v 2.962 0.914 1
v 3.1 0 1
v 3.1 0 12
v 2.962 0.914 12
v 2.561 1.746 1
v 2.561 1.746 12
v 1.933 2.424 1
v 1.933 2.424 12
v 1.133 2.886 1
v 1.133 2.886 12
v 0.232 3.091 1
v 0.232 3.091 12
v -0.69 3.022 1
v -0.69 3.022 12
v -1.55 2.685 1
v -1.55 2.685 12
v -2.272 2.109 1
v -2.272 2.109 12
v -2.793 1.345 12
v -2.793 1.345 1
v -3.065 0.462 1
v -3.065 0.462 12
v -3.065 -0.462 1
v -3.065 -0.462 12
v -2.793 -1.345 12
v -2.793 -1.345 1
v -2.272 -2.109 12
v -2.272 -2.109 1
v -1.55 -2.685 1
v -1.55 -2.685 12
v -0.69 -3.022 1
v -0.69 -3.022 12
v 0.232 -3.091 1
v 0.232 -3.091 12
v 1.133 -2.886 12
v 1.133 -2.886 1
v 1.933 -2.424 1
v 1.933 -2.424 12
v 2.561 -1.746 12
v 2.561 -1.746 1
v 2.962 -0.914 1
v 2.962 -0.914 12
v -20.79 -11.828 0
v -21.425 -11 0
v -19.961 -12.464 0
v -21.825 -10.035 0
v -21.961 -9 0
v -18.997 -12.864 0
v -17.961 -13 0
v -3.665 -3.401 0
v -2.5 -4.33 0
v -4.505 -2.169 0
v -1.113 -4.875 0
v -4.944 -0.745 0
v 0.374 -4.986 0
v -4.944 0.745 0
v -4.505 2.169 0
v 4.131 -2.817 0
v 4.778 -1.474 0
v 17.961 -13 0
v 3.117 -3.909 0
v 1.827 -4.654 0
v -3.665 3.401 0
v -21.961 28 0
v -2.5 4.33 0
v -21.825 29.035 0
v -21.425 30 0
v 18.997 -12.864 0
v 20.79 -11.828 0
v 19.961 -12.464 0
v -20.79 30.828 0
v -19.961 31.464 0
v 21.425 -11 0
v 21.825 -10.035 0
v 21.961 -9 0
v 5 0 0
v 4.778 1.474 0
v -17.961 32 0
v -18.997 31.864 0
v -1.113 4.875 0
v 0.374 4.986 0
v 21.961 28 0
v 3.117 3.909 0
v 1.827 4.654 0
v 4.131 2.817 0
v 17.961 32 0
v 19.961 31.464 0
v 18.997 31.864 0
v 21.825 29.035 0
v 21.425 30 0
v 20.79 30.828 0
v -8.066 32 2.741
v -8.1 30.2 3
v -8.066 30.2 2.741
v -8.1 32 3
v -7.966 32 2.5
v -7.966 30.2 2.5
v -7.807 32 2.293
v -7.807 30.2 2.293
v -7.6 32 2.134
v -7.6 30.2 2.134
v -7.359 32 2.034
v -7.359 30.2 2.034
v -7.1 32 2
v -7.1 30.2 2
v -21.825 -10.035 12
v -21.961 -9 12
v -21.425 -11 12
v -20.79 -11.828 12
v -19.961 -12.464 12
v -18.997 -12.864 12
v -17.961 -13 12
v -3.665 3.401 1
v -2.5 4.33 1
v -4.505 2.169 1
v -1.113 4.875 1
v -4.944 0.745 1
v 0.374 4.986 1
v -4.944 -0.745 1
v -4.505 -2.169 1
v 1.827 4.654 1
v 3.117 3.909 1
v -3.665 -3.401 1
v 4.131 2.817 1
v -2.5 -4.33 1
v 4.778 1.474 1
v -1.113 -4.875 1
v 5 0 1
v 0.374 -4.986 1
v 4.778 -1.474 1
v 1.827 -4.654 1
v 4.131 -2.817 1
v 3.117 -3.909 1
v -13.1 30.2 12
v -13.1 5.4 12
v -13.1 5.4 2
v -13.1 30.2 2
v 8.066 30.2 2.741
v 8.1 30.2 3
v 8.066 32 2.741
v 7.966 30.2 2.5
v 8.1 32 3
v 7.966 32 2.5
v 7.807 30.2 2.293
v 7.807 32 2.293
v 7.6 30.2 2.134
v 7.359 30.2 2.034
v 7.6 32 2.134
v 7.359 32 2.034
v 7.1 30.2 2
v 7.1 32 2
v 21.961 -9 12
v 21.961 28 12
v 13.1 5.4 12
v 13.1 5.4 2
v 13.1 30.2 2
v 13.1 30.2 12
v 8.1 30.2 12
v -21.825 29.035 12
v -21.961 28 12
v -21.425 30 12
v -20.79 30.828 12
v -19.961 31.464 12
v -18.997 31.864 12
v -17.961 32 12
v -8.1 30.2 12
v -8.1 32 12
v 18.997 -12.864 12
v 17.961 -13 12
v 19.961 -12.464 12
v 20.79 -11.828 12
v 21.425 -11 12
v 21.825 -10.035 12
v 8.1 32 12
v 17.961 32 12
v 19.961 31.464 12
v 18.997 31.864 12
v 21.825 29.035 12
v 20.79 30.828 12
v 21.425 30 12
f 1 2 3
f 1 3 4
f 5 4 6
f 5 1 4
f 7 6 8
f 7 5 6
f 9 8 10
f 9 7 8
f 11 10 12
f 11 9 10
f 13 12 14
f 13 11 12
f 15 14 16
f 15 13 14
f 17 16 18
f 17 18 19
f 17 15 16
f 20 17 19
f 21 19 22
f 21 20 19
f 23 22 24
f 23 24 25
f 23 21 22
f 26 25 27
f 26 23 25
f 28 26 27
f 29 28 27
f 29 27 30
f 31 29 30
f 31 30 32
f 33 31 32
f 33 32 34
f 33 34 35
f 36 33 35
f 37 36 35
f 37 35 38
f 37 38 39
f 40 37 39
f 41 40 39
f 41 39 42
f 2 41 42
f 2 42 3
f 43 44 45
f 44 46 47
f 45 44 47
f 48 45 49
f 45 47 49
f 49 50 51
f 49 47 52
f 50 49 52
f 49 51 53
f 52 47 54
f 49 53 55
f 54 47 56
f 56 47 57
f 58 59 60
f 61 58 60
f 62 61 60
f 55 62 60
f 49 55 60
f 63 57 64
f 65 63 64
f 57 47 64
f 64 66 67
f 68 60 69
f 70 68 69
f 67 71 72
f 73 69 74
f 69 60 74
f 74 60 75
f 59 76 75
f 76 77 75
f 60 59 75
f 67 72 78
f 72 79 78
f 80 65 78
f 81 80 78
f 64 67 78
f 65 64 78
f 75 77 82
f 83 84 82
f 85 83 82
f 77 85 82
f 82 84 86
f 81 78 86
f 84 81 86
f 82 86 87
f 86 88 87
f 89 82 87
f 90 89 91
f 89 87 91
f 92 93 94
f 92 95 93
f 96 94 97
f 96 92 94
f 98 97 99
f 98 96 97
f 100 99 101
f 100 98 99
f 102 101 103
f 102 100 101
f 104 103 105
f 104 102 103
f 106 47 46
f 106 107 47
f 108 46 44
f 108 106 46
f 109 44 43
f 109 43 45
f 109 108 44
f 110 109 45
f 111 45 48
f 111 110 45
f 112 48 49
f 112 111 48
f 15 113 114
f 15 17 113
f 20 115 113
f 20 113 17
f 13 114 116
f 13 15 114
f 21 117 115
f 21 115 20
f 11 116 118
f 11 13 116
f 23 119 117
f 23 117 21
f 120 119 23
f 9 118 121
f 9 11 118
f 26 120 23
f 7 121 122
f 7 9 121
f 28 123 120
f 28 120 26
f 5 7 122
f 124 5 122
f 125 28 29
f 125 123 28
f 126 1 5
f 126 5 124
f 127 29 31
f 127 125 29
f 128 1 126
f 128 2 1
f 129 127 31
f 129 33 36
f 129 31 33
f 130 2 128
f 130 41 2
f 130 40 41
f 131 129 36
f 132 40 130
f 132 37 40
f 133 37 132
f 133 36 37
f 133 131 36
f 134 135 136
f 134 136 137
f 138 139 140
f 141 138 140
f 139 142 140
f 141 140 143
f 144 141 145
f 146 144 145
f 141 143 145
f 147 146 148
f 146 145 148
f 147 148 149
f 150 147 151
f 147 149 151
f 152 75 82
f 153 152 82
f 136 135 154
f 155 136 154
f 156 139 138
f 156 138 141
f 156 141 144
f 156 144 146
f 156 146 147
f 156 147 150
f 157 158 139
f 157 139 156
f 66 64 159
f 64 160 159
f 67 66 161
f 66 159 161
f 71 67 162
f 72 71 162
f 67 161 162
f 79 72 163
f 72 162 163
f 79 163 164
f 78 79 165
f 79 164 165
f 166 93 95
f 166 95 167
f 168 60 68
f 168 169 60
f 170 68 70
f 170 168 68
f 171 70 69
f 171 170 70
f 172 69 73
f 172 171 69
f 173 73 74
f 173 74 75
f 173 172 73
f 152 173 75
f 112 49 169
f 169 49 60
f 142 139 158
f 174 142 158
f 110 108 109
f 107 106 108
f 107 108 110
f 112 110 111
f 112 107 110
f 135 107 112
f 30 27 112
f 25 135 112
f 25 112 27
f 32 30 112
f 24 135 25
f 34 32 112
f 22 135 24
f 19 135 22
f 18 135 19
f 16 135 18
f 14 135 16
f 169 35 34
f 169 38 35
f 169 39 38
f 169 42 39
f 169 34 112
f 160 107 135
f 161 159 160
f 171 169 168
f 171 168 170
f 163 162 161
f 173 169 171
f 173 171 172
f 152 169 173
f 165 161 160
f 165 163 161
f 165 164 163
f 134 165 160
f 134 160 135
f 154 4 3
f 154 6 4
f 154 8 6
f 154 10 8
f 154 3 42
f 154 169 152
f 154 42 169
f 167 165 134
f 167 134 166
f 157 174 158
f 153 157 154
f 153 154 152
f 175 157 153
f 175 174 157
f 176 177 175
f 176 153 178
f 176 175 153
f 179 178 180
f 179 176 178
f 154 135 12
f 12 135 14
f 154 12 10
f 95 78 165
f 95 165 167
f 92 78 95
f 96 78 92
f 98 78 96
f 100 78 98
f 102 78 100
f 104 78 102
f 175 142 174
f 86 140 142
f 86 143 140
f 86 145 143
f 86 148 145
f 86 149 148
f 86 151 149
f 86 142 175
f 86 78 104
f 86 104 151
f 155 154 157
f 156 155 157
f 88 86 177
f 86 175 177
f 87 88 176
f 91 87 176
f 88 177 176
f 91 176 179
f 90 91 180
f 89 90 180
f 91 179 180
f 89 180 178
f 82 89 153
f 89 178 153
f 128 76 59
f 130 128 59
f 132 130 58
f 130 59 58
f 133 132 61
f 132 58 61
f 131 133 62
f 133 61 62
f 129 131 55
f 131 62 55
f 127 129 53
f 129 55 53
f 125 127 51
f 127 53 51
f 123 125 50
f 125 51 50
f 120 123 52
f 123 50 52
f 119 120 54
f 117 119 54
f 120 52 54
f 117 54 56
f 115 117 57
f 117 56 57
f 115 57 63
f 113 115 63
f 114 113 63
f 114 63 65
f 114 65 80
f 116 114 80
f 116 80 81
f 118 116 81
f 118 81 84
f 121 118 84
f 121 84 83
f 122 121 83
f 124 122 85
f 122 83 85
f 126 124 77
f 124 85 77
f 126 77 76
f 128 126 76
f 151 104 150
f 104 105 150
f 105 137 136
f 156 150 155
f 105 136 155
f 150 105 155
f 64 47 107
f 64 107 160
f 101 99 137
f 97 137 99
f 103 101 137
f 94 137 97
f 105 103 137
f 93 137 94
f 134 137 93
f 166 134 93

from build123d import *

# Parameters (mm, degrees)
SKETCH_W        = 43.922756
SKETCH_H        = 45
SKETCH_R        = 3.1
PAD_DEPTH       = 12
SKETCH001_W     = 26.2
SKETCH001_H     = 24.8
POCKET_DEPTH    = 10
SKETCH002_R     = 5
POCKET001_DEPTH = 1
FILLET_R        = 4
SKETCH003_W     = 16.2
SKETCH003_H     = 10
POCKET002_DEPTH = 5
FILLET001_R     = 1


with BuildPart() as part:
    # Sketch → Pad (new body)
    with BuildSketch(Plane.XY):
        with Locations((0, 9.5)):
            Rectangle(SKETCH_W, SKETCH_H)
        Circle(SKETCH_R, mode=Mode.SUBTRACT)
    extrude(amount=PAD_DEPTH)

    # Sketch001 (on Face7 of Pad) → Pocket (cut)
    with BuildSketch(Plane.XY.offset(12)):
        with Locations((0, 17.8)):
            Rectangle(SKETCH001_W, SKETCH001_H)
    extrude(amount=-POCKET_DEPTH, mode=Mode.SUBTRACT)

    # Sketch002 (on Face4 of Pocket) → Pocket001 (cut)
    with BuildSketch(Plane(origin=(0, 0, 0), x_dir=(1, 0, 0), z_dir=(0, 0, -1))):
        Circle(SKETCH002_R)
    extrude(amount=-POCKET001_DEPTH, mode=Mode.SUBTRACT)

    # Fillet
    fillet_edges = [part.edges().sort_by_distance(p)[0] for p in [
        (21.961378, 32, 6),
        (-21.961378, 32, 6),
        (21.961378, -13, 6),
        (-21.961378, -13, 6),
    ]]
    fillet(fillet_edges, radius=FILLET_R)

    # Sketch003 (on Face16 of Fillet) → Pocket002 (cut)
    with BuildSketch(Plane.XZ.offset(-30.2)):
        with Locations((0, 7)):
            Rectangle(SKETCH003_W, SKETCH003_H)
    extrude(amount=-POCKET002_DEPTH, mode=Mode.SUBTRACT)

    # Fillet001
    fillet001_edges = [part.edges().sort_by_distance(p)[0] for p in [
        (8.1, 31.1, 2),
        (-8.1, 31.1, 2),
    ]]
    fillet(fillet001_edges, radius=FILLET001_R)


solid = part.part
